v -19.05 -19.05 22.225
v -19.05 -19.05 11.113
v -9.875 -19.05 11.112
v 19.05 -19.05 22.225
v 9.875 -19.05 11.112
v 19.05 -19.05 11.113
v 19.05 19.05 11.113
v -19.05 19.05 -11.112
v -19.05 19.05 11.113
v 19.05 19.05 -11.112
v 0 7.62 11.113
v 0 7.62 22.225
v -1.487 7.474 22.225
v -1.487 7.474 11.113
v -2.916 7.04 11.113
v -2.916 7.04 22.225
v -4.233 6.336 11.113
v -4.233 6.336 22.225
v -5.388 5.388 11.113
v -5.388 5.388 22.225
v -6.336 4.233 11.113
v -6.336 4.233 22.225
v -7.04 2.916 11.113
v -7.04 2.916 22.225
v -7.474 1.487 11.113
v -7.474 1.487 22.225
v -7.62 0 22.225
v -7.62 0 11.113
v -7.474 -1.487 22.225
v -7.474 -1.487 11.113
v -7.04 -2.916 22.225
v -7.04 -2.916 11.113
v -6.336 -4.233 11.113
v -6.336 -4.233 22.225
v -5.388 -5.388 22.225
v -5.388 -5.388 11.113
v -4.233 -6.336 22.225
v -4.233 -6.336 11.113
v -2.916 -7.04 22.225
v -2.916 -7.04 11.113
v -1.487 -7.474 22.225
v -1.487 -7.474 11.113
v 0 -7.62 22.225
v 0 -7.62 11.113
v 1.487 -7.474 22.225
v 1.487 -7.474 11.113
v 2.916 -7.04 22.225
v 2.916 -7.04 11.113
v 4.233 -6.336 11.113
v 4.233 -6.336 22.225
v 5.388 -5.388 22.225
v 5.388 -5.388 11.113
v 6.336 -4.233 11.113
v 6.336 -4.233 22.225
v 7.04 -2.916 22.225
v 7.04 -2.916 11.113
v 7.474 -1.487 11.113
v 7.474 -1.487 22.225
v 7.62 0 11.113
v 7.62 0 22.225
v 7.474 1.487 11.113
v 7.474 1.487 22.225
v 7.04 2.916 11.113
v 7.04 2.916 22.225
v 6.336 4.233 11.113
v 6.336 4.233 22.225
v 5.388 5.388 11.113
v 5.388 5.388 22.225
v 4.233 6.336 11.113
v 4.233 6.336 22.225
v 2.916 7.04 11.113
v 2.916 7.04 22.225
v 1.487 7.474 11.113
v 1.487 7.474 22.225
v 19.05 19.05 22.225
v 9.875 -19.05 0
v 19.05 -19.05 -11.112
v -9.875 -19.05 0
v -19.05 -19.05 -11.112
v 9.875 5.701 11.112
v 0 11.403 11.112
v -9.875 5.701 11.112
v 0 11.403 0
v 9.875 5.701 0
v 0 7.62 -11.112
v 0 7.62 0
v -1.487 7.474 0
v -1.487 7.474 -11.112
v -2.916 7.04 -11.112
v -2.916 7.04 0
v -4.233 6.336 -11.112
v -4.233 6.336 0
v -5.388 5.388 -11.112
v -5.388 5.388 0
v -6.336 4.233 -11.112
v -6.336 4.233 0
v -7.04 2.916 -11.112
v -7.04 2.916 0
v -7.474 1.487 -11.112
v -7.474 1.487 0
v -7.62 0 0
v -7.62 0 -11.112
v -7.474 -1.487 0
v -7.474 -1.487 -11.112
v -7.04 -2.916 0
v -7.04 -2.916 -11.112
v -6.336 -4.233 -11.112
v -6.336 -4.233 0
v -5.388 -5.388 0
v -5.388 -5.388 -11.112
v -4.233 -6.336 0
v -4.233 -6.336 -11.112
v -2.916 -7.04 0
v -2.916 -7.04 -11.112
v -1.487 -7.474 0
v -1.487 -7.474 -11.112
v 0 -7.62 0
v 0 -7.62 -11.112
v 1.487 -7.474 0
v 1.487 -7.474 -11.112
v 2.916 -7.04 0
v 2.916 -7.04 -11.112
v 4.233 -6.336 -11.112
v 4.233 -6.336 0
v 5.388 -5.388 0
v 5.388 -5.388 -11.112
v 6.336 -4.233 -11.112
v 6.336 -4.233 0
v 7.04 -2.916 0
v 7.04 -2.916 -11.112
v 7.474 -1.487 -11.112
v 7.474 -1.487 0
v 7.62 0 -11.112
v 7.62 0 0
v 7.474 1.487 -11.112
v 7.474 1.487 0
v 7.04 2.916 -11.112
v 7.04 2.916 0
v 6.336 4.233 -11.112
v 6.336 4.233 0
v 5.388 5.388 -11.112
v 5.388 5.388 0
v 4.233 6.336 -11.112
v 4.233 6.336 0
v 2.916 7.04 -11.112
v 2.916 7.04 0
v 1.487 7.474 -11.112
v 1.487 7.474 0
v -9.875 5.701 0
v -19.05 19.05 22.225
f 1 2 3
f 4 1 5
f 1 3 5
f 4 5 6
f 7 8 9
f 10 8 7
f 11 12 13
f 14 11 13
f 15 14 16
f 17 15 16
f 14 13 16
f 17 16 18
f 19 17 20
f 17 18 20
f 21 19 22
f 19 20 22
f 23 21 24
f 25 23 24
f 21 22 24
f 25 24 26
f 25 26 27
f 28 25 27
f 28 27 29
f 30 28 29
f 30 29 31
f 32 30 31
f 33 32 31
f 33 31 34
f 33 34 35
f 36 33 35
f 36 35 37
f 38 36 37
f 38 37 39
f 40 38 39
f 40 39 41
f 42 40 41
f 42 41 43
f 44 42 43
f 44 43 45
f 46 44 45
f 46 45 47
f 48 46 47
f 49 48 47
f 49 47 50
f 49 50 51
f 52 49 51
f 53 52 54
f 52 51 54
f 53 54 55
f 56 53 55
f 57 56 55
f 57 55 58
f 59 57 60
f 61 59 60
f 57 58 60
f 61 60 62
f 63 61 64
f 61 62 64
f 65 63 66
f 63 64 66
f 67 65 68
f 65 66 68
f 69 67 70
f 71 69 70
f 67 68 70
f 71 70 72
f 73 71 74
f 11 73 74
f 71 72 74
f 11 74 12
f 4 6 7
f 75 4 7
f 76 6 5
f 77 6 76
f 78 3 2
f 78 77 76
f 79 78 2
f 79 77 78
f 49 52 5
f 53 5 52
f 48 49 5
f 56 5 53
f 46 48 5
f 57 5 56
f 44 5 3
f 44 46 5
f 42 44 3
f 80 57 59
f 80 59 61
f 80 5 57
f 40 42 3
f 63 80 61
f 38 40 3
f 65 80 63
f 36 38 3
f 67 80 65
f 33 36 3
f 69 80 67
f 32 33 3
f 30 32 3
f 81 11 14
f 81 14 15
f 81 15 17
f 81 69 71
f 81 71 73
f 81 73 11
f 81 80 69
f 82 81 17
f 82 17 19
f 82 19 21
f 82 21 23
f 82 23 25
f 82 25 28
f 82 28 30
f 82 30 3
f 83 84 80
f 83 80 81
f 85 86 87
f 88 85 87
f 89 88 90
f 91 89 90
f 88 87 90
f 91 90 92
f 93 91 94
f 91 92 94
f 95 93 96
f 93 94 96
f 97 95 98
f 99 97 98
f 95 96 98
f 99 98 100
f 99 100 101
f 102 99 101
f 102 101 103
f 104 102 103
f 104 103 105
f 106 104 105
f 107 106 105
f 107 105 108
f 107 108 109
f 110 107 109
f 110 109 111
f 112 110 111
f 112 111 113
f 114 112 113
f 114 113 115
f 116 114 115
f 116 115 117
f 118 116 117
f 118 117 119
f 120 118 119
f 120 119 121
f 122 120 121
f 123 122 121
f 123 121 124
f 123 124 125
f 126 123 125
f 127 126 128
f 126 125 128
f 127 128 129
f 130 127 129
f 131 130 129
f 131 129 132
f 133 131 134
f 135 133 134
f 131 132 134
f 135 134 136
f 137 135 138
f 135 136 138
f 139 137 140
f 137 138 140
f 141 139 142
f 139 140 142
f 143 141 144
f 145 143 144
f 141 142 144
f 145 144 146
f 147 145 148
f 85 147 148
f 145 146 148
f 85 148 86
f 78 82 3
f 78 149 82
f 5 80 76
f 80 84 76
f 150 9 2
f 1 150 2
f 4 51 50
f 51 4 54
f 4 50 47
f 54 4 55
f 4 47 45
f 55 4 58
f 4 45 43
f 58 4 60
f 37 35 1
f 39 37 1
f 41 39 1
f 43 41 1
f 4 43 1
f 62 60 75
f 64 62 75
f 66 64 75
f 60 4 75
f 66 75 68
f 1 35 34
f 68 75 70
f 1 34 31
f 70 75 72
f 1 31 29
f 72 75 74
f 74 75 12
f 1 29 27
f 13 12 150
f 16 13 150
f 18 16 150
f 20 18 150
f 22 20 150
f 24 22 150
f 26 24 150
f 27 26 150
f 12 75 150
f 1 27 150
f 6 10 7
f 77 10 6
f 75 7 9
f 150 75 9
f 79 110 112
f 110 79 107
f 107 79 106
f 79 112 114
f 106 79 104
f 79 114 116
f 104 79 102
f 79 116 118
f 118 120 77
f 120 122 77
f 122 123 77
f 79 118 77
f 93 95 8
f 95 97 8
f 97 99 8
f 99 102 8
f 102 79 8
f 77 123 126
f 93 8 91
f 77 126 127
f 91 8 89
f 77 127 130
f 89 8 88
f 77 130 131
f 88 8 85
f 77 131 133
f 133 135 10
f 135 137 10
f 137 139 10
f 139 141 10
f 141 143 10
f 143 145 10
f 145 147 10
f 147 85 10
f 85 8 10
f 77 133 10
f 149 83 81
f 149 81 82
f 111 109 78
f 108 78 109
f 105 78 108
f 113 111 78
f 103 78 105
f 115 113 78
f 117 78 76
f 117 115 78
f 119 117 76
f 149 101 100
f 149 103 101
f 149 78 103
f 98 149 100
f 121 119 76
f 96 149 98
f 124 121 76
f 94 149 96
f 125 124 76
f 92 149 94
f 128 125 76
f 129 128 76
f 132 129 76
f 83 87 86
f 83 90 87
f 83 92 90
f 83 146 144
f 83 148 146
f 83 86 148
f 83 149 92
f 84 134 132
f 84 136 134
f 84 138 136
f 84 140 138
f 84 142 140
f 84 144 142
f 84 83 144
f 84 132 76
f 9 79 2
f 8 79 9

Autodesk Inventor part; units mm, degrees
ref_plane "YZ Plane" through (0, 0, 0) normal (1, 0, 0) x (0, 1, 0)
ref_plane "XZ Plane" through (0, 0, 0) normal (0, 1, 0) x (-1, 0, 0)
sketch "Sketch1" plane through (0, 0, 0) normal (0, 0, 1) x (1, 0, 0)
  line L0 (0, -10.9985) -> (-9.525, -5.4993)
  line L1 (-9.525, -5.4993) -> (-9.525, 5.4993)
  line L2 (-9.525, 5.4993) -> (0, 10.9985)
  line L3 (0, 10.9985) -> (9.525, 5.4993)
  line L4 (9.525, 5.4993) -> (9.525, -5.4993)
  line L5 (9.525, -5.4993) -> (0, -10.9985)
  point P0 (0, 0)
  point P1 (0, 0)
  dimension "d0" = 19.05
  dimension "d1" = 21.9971
sketch "Sketch2" plane through (0, 0, 0) normal (0, 0, 1) x (1, 0, 0)
  line L0 (-19.05, -19.05) -> (-19.05, 19.05)
  line L1 (-19.05, 19.05) -> (19.05, 19.05)
  line L2 (19.05, 19.05) -> (19.05, -19.05)
  line L3 (19.05, -19.05) -> (-19.05, -19.05)
  circle A0 centre (0, 0) radius 6.35 construction
  circle A1 centre (0, 0) radius 6.35 construction
  line L4 (0, -10.9985) -> (-9.525, -5.4993) construction
  line L5 (-9.525, -5.4993) -> (-9.525, 5.4993) construction
  line L6 (-9.525, 5.4993) -> (0, 10.9985) construction
  line L7 (0, 10.9985) -> (9.525, 5.4993) construction
  line L8 (9.525, 5.4993) -> (9.525, -5.4993) construction
  line L9 (9.525, -5.4993) -> (0, -10.9985) construction
  line L10 (0, 11.4027) -> (-9.875, 5.7013)
  line L11 (-9.875, 5.7013) -> (-9.875, -5.7013) construction
  line L12 (-9.875, -5.7013) -> (0, -11.4027) construction
  line L13 (0, -11.4027) -> (9.875, -5.7013) construction
  line L14 (9.875, -5.7013) -> (9.875, 5.7013) construction
  line L15 (9.875, 5.7013) -> (0, 11.4027)
  line L16 (-9.875, 5.7013) -> (-9.875, -19.05)
  line L17 (9.875, 5.7013) -> (9.875, -19.05)
  dimension "d11" = 38.1
  dimension "d12" = 0.35
extrude "Extrusion2" add sketch "Sketch2" along normal blind 11.1125 contours L0 L1 L2 L3 L17 L15 L10 L16
extrude "Extrusion4" add sketch "Sketch2" against normal blind 11.1125
ref_plane "Work Plane1" through (0, 0, 5.5563) normal (0, 0, 1) x (1, 0, 0)
mirror "Mirror1" about plane through (0, 0, 5.5563) normal (0, 0, 1) of "Extrusion4"
sketch "Sketch4" plane through (0, 0, -11.1125) normal (0, 0, -1) x (-1, 0, 0)
  point P0 (0, 0)
hole "Hole2" at (0, 0, -11.1125) direction (0, 0, 1) diameter 15.24 end through all
equation "\"d11\" = 2 * d0"
properties part number "halfinchNUT"
